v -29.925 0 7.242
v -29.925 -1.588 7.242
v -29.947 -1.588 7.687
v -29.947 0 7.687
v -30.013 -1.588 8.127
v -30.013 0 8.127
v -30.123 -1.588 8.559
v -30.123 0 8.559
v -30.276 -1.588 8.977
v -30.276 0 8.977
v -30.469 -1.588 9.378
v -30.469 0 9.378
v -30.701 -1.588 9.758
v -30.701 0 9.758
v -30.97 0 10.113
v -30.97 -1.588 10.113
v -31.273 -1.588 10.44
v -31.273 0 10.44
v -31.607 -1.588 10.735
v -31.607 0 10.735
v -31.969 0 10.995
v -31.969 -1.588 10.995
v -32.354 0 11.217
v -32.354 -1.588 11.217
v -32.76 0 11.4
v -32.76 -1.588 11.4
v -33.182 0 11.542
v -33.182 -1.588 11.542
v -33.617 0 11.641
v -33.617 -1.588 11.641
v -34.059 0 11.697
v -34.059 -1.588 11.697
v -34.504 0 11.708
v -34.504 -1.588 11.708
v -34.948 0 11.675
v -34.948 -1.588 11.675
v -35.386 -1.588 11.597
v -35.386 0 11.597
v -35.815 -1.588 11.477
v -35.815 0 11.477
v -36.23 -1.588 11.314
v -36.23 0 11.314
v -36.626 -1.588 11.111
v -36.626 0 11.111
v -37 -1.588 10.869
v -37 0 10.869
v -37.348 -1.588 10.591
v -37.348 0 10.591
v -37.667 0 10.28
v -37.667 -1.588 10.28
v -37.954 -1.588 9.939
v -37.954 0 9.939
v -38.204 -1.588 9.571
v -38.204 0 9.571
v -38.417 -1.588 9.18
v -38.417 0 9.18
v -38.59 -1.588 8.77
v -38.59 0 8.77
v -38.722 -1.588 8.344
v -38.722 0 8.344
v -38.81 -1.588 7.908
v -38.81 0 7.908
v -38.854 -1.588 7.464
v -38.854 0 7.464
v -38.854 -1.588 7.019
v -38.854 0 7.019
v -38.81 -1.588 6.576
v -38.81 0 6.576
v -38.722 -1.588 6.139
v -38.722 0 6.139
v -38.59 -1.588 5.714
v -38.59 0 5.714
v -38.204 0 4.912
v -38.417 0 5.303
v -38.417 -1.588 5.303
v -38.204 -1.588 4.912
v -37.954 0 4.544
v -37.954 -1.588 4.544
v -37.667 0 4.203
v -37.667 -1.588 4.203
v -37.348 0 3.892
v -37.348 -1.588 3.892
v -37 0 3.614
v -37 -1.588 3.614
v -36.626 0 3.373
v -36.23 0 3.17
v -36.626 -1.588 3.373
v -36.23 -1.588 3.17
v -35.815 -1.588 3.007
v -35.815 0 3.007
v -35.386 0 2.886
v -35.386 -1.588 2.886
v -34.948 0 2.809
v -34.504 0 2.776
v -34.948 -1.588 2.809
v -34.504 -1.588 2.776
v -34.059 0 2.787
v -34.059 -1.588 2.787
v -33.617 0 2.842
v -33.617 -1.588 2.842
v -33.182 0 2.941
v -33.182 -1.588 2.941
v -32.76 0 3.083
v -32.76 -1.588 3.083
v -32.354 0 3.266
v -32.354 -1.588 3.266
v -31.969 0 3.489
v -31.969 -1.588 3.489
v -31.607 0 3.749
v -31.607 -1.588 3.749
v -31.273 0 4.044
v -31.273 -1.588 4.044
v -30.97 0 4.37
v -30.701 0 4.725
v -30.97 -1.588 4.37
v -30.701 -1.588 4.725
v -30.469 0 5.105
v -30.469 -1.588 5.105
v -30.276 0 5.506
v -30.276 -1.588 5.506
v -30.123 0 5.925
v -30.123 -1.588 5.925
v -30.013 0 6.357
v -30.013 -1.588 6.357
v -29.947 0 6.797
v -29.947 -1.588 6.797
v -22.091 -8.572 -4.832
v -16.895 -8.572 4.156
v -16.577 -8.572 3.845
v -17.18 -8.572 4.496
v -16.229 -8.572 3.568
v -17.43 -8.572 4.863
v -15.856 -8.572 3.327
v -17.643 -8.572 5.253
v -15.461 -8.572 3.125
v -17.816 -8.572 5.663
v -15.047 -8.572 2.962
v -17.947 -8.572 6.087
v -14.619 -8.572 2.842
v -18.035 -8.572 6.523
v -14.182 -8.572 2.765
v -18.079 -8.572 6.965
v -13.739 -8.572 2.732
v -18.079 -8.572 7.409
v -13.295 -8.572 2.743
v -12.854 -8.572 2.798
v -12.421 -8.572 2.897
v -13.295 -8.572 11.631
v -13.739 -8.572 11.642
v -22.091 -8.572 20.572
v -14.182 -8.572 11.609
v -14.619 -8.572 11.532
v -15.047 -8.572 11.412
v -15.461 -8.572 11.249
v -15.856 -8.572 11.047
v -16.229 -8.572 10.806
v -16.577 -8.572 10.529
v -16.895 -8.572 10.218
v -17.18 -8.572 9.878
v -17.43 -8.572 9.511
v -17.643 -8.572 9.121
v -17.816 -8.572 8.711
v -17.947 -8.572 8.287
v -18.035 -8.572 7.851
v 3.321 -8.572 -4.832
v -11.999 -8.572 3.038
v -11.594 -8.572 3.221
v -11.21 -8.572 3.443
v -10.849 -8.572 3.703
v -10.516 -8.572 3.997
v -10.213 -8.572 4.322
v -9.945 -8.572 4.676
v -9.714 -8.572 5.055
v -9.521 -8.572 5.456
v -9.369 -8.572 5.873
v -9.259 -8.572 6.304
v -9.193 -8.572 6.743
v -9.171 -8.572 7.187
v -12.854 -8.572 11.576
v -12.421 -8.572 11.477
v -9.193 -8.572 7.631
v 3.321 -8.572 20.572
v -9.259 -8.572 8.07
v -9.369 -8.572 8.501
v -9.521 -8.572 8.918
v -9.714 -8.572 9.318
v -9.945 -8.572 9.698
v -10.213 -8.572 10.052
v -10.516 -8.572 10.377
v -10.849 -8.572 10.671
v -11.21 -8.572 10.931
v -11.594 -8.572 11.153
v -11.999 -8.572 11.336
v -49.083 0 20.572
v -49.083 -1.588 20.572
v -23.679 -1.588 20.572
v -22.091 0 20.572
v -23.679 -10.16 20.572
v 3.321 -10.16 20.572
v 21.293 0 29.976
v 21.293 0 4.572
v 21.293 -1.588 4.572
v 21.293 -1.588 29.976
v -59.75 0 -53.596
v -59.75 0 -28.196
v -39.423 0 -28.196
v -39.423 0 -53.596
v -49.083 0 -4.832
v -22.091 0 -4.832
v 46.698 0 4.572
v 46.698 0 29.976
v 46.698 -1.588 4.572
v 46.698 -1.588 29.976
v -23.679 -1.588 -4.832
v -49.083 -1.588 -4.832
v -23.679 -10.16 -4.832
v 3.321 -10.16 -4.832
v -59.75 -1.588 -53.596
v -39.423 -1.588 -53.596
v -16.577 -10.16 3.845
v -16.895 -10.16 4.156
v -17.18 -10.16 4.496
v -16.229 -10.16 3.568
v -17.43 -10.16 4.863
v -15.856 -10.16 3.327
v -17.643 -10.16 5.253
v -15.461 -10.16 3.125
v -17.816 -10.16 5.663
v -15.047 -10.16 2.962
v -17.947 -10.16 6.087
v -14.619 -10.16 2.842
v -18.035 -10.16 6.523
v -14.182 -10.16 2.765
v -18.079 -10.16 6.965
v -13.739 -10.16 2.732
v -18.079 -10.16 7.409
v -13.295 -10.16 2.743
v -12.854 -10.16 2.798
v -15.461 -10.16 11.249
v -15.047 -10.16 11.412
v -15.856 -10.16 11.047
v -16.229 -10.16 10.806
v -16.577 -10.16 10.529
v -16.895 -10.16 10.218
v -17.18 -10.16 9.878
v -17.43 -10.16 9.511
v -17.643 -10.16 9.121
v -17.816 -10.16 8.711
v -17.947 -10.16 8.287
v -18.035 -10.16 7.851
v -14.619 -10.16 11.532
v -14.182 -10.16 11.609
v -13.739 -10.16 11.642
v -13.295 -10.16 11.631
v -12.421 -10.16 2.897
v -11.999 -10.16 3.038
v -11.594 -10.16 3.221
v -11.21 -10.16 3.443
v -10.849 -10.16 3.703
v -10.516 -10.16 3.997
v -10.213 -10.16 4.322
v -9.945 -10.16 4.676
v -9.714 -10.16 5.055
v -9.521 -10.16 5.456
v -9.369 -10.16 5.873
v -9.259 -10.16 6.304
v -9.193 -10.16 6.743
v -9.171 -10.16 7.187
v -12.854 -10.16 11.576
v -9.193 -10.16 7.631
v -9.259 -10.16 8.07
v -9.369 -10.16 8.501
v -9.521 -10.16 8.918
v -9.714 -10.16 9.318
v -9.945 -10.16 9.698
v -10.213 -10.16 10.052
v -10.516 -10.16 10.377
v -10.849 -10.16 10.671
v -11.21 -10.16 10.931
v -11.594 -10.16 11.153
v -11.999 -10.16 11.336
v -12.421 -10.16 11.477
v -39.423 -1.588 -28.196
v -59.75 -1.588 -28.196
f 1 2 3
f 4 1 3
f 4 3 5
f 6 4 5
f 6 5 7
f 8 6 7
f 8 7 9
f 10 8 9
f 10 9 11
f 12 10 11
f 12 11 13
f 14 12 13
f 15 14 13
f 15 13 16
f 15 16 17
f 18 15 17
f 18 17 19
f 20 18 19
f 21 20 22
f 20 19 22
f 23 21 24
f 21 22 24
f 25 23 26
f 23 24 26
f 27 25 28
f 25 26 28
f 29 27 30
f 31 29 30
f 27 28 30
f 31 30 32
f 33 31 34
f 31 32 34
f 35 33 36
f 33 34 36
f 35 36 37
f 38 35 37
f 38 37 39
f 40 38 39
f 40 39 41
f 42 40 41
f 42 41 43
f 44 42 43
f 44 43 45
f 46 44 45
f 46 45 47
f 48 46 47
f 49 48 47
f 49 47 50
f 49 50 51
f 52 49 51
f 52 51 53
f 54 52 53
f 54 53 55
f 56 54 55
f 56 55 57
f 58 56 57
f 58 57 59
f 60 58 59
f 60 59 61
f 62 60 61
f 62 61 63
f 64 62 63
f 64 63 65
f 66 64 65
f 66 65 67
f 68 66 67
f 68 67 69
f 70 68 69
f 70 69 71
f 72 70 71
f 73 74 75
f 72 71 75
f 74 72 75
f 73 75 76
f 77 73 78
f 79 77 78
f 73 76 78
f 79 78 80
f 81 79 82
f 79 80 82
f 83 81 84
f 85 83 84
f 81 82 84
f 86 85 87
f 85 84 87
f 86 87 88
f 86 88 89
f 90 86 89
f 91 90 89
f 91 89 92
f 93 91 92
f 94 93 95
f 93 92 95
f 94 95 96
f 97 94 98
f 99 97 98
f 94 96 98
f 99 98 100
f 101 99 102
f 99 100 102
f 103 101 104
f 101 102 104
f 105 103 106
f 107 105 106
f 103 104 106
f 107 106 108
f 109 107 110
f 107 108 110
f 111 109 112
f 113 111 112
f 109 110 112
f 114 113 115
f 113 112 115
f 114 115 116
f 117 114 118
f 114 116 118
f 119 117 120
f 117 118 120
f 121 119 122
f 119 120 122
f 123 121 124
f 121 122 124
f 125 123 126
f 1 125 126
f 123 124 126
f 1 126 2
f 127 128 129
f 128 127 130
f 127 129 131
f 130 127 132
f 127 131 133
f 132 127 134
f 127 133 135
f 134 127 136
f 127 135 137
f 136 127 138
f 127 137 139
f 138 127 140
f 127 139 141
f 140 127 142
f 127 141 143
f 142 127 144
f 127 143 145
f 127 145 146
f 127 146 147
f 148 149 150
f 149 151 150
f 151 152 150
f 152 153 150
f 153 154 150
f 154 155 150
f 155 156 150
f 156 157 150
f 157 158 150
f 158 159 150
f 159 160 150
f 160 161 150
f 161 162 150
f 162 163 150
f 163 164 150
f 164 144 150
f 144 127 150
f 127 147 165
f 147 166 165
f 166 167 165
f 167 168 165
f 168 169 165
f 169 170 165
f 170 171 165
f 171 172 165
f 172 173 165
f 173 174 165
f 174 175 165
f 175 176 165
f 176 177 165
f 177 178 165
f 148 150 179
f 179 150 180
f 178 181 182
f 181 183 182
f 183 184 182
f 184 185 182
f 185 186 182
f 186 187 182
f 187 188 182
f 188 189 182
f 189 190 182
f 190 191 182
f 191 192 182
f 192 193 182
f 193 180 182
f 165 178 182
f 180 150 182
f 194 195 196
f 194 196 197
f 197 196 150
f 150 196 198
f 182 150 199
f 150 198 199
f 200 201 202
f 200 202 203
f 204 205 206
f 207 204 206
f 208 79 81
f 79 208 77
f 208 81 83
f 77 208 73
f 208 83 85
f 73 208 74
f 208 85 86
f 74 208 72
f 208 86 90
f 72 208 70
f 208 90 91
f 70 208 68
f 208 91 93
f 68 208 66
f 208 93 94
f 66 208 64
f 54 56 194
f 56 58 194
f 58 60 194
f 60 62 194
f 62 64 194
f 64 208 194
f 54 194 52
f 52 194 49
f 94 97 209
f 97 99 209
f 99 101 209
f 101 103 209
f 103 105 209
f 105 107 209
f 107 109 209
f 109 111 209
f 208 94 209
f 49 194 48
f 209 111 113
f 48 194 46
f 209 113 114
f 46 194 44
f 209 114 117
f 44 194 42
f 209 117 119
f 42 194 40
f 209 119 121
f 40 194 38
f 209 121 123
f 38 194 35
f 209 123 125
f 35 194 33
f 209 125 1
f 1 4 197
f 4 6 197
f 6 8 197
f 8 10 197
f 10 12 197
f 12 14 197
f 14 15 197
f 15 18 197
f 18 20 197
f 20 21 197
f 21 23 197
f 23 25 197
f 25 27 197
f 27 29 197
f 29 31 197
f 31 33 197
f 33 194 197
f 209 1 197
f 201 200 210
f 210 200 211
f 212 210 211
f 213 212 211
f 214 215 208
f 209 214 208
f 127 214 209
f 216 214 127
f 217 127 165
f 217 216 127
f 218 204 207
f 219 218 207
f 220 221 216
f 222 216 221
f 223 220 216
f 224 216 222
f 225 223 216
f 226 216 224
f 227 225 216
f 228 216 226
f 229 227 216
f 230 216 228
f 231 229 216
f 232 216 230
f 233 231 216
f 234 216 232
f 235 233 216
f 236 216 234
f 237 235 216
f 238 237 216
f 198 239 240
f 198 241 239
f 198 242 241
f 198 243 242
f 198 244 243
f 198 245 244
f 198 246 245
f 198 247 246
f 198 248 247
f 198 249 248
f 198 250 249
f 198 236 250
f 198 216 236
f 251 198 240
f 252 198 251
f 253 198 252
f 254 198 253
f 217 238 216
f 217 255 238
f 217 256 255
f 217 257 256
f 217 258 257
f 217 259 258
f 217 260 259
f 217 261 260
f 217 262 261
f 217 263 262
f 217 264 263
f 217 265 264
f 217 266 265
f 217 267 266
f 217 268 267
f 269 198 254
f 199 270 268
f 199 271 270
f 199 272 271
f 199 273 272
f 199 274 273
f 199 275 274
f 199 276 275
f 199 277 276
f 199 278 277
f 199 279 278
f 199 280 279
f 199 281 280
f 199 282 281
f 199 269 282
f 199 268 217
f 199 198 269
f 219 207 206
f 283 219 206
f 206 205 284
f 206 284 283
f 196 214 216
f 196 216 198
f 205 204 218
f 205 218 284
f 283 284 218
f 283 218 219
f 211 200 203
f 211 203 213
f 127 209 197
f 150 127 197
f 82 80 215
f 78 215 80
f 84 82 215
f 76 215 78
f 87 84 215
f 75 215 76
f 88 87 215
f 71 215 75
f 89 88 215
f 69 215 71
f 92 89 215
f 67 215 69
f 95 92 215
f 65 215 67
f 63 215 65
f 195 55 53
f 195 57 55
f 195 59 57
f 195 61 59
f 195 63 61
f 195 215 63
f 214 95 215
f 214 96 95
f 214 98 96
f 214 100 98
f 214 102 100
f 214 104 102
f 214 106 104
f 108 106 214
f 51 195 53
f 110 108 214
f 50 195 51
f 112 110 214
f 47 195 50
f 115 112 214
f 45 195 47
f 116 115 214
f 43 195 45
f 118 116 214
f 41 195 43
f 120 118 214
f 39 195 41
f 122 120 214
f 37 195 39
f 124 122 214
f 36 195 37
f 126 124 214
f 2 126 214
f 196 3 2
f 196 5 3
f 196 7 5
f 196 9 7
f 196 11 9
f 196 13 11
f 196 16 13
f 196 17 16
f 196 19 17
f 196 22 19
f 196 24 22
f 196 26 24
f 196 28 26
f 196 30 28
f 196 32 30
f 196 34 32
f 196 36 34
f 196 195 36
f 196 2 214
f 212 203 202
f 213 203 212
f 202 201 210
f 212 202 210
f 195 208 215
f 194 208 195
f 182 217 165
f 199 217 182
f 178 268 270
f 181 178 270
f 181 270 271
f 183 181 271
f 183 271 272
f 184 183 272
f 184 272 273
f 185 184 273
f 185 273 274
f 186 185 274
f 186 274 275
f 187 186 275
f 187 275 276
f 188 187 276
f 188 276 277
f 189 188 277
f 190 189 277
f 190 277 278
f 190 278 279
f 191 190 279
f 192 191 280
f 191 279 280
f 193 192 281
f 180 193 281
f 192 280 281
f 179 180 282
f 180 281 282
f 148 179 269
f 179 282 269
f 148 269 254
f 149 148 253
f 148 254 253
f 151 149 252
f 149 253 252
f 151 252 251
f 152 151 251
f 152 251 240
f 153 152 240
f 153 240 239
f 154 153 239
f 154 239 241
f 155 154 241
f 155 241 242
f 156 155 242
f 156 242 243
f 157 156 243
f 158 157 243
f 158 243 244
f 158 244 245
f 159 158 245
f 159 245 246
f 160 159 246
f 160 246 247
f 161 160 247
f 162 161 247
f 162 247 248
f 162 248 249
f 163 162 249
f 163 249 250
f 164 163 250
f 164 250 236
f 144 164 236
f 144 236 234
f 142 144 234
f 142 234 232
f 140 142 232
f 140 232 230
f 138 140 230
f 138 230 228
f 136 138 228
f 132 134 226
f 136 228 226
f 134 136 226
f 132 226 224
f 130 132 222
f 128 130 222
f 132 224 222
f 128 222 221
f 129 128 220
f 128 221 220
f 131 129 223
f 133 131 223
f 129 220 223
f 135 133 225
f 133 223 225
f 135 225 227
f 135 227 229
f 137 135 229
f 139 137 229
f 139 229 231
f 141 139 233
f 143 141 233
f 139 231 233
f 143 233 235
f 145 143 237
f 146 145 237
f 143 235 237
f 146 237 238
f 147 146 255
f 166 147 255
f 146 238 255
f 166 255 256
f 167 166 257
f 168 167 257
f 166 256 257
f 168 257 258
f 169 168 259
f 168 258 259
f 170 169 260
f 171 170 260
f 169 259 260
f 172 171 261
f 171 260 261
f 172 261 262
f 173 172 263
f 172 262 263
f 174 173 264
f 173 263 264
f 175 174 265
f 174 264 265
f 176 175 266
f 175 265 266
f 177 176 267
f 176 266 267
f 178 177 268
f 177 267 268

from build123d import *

# Parameters (mm, degrees)
F0_W      = 1.5875
F0_H      = 25.4043829627
F1_DEPTH  = 10.16
F0_W_2    = 25.4043843597
F2_DEPTH  = 1.5875
F3_W      = 25.4116732202
F3_H      = 25.4043829627
F4_DEPTH  = 1.5875
F5_W      = 20.3264839947
F5_H      = 25.4
F6_DEPTH  = 1.5875
F7_R      = 4.4567576485
F8_DEPTH  = 25.4
F9_R      = 4.4675198024
F10_DEPTH = 25.4


with BuildPart() as f1:
    # F0 (on Front) → F1 (new body)
    with BuildSketch(Plane.XZ):
        with Locations((-22.8847930461, 7.8698357102)):
            Rectangle(F0_W, F0_H)
    extrude(amount=F1_DEPTH)

    # F0 (on Front) → F2 (join)
    with BuildSketch(Plane.XZ):
        with Locations((-36.380735226, 7.8698357102)):
            Rectangle(F0_W_2, F0_H)
        with Locations((-22.8847930461, 7.8698357102)):
            Rectangle(F0_W, F0_H)
    extrude(amount=F2_DEPTH)

    # F3 (on face) → F4 (join)
    with BuildSketch(Plane.XZ.offset(10.16)):
        with Locations((-9.385206436, 7.8698357102)):
            Rectangle(F3_W, F3_H)
    extrude(amount=-F4_DEPTH)

    # F7 (on face) → F8 (cut)
    with BuildSketch(Plane.XZ.offset(10.16)):
        with Locations((-13.6275719851, 7.186954841)):
            Circle(F7_R)
    extrude(amount=-F8_DEPTH, mode=Mode.SUBTRACT)

    # F9 (on face) → F10 (cut)
    with BuildSketch(Plane.XZ.offset(1.5875)):
        with Locations((-34.3923680484, 7.2417431511)):
            Circle(F9_R)
    extrude(amount=-F10_DEPTH, mode=Mode.SUBTRACT)


with BuildPart() as f2:
    # F0 (on Front) → F2, piece 2 (new body)
    with BuildSketch(Plane.XZ):
        with Locations((33.9954560623, 17.2741909046)):
            Rectangle(F0_W_2, F0_H)
    extrude(amount=F2_DEPTH)


with BuildPart() as f6:
    # F5 (on Front) → F6 (new body)
    with BuildSketch(Plane.XZ):
        with Locations((-49.5862867683, -40.8960048437)):
            Rectangle(F5_W, F5_H)
    extrude(amount=F6_DEPTH)


solid = Compound([f1.part, f2.part, f6.part])
